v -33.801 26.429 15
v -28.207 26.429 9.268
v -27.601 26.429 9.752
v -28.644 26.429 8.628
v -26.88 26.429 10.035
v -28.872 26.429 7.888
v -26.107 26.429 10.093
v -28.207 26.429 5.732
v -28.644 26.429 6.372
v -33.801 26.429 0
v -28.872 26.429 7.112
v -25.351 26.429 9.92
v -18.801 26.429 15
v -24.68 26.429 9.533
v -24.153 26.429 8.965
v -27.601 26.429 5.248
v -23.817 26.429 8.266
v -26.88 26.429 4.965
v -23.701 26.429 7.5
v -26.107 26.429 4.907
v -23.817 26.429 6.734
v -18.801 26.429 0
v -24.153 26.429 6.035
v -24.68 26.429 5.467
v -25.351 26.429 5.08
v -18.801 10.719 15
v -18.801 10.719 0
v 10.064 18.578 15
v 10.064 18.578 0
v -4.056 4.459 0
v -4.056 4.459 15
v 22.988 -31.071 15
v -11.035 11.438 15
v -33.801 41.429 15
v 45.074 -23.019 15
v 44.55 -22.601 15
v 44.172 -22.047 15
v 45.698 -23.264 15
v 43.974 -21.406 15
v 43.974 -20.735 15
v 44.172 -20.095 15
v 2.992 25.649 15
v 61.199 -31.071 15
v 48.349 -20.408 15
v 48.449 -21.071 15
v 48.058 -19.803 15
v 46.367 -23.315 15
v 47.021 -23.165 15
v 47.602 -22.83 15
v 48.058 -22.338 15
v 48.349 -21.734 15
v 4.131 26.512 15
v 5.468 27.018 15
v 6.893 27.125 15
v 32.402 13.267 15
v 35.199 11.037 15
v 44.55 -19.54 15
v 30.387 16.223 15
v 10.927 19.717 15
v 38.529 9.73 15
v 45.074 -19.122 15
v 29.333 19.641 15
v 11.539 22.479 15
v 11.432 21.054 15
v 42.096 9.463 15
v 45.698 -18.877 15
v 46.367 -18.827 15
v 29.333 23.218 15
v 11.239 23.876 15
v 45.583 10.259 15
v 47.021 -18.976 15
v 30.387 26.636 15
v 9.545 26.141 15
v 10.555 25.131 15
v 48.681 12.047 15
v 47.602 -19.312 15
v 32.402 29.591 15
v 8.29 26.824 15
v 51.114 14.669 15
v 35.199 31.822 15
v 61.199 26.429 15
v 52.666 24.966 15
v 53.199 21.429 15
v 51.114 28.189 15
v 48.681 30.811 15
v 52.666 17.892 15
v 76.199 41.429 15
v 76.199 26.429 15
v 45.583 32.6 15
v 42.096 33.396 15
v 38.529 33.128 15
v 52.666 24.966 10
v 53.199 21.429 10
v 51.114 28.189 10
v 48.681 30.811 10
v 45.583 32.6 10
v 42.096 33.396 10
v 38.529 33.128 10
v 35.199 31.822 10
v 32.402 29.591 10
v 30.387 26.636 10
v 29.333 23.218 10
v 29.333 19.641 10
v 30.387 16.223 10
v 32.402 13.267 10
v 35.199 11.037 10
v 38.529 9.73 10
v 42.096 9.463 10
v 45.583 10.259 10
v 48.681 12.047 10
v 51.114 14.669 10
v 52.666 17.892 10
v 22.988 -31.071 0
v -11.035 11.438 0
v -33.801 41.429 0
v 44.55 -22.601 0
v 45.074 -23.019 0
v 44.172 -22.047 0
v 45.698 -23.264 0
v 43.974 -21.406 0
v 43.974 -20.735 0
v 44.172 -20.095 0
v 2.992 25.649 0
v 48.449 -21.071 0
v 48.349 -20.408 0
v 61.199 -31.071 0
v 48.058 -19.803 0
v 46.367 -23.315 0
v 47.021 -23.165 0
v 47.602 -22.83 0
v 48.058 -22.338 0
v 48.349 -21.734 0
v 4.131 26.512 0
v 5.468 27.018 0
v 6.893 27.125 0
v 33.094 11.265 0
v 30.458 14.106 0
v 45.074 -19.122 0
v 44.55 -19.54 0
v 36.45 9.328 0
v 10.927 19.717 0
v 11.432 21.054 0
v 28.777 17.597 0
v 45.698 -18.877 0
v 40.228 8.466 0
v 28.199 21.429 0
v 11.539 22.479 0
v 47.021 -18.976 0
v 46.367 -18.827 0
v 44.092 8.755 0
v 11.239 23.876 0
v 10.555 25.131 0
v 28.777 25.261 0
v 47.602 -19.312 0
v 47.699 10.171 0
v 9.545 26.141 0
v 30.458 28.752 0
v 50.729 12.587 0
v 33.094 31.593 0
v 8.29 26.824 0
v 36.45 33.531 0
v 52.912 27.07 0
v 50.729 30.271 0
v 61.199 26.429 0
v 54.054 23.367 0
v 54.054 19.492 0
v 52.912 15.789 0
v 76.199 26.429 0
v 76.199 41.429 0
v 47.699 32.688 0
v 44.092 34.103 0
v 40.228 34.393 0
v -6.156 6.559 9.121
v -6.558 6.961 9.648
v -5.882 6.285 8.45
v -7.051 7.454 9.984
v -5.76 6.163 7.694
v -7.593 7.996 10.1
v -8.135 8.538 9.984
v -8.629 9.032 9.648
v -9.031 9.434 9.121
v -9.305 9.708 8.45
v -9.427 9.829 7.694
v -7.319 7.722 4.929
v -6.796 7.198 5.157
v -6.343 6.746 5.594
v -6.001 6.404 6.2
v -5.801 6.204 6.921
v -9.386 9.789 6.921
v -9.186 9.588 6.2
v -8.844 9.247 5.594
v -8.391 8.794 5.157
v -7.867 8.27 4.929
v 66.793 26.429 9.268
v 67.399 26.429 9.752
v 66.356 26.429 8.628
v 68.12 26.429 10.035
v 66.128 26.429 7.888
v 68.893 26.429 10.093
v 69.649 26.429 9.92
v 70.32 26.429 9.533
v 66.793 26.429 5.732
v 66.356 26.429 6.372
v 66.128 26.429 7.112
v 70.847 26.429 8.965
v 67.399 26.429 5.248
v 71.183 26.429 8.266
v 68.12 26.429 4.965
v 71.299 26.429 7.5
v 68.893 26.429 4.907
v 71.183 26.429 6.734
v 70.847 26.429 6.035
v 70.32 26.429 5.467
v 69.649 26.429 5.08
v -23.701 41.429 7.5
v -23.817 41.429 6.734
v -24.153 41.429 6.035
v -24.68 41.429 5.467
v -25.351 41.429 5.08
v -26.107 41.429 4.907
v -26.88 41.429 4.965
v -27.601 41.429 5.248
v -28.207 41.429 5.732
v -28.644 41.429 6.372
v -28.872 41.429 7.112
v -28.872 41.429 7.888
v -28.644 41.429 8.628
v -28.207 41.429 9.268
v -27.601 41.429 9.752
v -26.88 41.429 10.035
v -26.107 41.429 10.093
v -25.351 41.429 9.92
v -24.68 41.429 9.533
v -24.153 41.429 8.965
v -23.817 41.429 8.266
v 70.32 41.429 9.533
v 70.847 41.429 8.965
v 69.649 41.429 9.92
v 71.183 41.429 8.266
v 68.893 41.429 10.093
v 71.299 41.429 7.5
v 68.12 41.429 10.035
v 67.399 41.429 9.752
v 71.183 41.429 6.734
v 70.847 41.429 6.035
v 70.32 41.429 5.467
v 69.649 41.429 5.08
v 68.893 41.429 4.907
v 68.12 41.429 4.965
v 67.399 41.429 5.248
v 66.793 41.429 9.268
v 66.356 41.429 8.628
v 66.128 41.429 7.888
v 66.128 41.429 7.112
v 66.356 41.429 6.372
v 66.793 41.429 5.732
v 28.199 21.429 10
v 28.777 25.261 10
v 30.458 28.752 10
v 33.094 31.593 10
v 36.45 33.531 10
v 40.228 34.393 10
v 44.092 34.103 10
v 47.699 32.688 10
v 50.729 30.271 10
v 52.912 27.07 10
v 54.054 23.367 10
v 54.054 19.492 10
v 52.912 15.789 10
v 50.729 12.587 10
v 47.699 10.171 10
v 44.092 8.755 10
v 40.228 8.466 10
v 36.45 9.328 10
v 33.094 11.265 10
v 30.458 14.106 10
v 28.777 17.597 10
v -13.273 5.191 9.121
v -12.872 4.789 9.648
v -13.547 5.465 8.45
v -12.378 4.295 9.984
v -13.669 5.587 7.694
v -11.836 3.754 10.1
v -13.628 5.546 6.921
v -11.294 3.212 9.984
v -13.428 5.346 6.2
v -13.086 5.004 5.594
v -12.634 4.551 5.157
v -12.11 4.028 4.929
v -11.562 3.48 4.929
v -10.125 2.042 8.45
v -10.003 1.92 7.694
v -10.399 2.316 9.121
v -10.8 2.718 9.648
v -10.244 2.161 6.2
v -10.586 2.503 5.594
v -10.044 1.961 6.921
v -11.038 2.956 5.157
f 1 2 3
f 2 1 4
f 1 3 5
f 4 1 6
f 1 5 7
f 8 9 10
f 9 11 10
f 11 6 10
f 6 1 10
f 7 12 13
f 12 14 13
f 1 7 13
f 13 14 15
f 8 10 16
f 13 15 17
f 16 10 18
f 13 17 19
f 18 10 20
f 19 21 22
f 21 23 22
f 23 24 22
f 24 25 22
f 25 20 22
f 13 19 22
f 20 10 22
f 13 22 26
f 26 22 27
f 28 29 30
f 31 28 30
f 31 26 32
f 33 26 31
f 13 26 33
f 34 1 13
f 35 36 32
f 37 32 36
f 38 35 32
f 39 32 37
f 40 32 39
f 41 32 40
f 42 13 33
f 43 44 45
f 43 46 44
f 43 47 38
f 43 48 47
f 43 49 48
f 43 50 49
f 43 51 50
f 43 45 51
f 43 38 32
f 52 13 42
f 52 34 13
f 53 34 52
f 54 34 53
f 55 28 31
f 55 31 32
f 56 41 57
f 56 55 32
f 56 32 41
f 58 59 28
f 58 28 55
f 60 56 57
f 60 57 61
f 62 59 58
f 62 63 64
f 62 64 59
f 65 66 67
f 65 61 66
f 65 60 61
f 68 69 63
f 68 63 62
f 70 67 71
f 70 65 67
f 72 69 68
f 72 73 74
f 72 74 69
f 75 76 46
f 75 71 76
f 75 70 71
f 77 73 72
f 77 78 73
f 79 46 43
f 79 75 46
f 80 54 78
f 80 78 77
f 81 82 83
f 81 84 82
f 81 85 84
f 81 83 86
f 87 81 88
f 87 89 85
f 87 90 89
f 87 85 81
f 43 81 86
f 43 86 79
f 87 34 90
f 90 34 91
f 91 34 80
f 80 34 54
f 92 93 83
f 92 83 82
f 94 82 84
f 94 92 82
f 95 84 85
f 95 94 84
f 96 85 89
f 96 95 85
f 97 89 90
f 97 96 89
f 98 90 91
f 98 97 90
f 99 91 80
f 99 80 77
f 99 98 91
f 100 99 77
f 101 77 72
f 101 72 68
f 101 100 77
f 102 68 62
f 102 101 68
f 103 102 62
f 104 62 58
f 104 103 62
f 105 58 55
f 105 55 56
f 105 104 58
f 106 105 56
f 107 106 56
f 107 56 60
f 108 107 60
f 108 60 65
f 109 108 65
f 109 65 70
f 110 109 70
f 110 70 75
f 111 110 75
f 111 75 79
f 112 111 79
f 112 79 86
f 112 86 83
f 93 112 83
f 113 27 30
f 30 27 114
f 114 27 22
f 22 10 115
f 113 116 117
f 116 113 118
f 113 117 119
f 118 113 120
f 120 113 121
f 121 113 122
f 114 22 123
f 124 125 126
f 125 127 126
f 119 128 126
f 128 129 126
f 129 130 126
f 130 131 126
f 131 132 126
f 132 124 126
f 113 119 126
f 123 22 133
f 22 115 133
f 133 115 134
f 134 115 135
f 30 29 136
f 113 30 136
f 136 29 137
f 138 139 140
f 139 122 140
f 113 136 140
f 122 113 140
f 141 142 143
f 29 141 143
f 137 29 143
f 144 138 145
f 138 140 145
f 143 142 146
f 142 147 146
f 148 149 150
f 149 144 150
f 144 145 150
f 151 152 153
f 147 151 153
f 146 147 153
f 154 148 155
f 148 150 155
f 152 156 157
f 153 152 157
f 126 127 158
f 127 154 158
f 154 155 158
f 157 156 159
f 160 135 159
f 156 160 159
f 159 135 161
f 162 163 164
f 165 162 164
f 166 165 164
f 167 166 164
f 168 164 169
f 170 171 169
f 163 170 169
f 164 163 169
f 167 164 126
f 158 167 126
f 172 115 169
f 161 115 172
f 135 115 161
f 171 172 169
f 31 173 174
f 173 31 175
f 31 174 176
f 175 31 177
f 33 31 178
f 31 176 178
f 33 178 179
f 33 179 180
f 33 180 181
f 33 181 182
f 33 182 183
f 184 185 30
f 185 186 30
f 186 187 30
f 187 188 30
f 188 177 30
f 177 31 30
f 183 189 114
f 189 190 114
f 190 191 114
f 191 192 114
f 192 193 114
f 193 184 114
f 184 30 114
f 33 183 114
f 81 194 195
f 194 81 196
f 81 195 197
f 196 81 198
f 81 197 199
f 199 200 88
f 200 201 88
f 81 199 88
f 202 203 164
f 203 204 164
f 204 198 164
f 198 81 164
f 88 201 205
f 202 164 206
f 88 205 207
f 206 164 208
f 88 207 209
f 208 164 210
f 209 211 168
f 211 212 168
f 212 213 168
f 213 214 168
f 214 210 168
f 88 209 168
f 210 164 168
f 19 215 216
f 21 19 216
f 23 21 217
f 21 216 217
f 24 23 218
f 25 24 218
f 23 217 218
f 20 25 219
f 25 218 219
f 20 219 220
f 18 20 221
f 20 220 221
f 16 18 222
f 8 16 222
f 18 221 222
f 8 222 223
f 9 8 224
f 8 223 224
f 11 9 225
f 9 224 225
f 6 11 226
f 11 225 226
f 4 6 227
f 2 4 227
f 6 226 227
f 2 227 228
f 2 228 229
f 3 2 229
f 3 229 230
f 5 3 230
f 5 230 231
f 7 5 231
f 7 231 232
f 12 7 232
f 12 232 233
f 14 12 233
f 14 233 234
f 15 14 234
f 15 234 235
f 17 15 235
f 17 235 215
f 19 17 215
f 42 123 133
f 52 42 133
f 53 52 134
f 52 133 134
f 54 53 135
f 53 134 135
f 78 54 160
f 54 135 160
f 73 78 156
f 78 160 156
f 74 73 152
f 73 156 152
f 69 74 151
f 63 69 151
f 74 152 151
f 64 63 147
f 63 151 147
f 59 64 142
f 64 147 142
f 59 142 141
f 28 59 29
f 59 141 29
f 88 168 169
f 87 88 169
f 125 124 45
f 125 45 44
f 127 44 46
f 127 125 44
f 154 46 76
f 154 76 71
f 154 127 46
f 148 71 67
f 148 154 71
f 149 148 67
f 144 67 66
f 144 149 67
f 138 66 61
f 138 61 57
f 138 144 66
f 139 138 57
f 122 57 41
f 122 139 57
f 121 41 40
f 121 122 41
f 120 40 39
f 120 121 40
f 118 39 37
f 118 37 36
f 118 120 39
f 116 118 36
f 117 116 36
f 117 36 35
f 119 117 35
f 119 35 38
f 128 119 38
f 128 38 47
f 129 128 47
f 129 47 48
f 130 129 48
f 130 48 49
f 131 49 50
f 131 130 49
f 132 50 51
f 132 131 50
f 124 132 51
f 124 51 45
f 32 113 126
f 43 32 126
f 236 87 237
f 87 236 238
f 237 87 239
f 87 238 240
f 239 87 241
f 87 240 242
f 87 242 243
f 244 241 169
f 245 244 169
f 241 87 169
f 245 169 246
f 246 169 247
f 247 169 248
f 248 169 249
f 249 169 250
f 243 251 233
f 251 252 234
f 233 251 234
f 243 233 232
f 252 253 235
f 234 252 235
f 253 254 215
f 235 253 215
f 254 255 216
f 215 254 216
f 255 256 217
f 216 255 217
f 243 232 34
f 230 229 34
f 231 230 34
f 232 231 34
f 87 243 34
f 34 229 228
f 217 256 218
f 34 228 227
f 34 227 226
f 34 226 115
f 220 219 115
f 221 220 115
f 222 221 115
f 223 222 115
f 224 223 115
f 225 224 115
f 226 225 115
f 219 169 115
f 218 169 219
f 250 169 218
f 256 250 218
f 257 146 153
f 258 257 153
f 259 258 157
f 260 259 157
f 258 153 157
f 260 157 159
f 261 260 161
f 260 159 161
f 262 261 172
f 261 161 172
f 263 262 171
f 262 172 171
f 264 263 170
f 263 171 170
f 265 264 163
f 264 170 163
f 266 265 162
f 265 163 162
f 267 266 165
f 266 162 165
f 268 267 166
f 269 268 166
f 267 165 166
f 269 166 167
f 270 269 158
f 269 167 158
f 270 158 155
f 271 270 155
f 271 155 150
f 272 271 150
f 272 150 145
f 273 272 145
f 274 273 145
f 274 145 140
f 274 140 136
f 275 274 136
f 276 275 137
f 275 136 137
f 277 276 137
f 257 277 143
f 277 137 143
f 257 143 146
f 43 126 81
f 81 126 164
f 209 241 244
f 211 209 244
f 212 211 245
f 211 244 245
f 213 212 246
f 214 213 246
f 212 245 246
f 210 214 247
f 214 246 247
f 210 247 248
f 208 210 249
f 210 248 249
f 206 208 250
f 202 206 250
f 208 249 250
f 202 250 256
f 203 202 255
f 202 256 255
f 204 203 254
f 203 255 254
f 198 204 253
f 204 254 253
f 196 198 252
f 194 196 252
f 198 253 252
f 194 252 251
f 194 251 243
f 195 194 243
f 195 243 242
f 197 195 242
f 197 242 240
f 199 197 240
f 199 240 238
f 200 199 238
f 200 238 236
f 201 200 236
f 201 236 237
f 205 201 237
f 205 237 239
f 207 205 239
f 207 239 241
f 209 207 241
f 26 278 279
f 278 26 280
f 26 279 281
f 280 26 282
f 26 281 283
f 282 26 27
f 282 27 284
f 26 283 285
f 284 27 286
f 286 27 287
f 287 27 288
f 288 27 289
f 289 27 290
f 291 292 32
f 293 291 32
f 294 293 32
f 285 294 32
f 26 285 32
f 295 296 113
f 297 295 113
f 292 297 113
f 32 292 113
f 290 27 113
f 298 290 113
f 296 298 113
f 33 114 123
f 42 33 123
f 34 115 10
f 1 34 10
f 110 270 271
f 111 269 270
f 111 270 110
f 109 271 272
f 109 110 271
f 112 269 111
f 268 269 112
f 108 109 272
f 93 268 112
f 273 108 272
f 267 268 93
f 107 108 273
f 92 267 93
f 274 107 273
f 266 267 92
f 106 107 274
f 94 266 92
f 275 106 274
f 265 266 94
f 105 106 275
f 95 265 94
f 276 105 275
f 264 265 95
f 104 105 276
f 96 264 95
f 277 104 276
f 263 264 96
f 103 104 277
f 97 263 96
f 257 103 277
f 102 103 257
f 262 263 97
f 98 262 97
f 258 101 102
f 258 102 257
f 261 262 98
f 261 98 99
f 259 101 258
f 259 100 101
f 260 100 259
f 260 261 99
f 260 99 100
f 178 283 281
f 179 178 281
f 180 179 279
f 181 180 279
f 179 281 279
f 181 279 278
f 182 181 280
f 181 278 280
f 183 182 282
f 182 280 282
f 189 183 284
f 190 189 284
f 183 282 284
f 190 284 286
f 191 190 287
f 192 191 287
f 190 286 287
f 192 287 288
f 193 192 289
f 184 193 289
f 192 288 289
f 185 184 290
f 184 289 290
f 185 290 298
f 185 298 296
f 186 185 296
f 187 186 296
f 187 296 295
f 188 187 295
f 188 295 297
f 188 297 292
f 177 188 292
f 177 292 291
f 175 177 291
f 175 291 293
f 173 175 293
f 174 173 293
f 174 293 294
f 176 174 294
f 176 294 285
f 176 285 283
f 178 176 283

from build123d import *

# Parameters (mm, degrees)
SKETCH_1_R          = 12
SKETCH_1_R_2        = 2.25
EXTRUDE_1_DEPTH     = 15
SKETCH_2_R          = 13
CUT_EXTRUDE_1_DEPTH = 10
SKETCH_3_R          = 2.6
CUT_EXTRUDE_2_DEPTH = 73.5
SKETCH_5_R          = 2.6
CUT_EXTRUDE_3_DEPTH = 10


with BuildPart() as part:
    # 草图1 → 凸台-拉伸1 (new body)
    with BuildSketch(Plane.XY):
        Polygon((-33.800989673, 26.429197467), (-27.44059998, 26.429197467), (-18.800989673, 26.429197467), (-18.800989673, 10.718519348), (22.988332208, -31.070802533), (61.199010327, -31.070802533), (61.199010327, 26.429197467), (76.199010327, 26.429197467), (76.199010327, 41.429197467), (56.199010327, 41.429197467), (-33.800989673, 41.429197467), align=None)
        with Locations((41.199010327, 21.429197467)):
            Circle(SKETCH_1_R, mode=Mode.SUBTRACT)
        with Locations((46.199010327, -21.070802533)):
            Circle(SKETCH_1_R_2, mode=Mode.SUBTRACT)
        with BuildLine():
            Line((-11.034973369, 11.437784418), (2.9923212, 25.648765615))
            ThreePointArc((2.9923212, 25.648765615), (10.086164278, 25.671985824), (10.063536665, 18.57814083))
            Line((10.063536665, 18.57814083), (-4.055896558, 4.458707607))
            Line((-4.055896558, 4.458707607), (-11.034973369, 11.437784418))
        make_face(mode=Mode.SUBTRACT)
    extrude(amount=EXTRUDE_1_DEPTH)

    # 草图2 → 切除-拉伸1 (cut)
    with BuildSketch(Plane(origin=(0, 0, 0), x_dir=(-1, 0, 0), z_dir=(0, 0, -1))):
        with Locations((-41.199010327, 21.429197467)):
            Circle(SKETCH_2_R)
    extrude(amount=-CUT_EXTRUDE_1_DEPTH, mode=Mode.SUBTRACT)

    # 草图3 → 切除-拉伸2 (cut, through all)
    with BuildSketch(Plane(origin=(0, 41.429197467, 0), x_dir=(1, 0, 0), z_dir=(0, 1, 0))):
        with Locations((-26.300989673, -7.5)):
            Circle(SKETCH_3_R)
        with Locations((68.699010327, -7.5)):
            Circle(SKETCH_3_R)
    extrude(amount=-CUT_EXTRUDE_2_DEPTH, mode=Mode.SUBTRACT)

    # 草图5 → 切除-拉伸3 (cut)
    with BuildSketch(Plane(origin=(-4.041235162, -4.041235162, 0), x_dir=(0, 0, 1), z_dir=(-0.707106781, -0.707106781, 0))):
        with Locations((7.5, 11.023445006)):
            Circle(SKETCH_5_R)
    extrude(amount=-CUT_EXTRUDE_3_DEPTH, mode=Mode.SUBTRACT)


solid = part.part
